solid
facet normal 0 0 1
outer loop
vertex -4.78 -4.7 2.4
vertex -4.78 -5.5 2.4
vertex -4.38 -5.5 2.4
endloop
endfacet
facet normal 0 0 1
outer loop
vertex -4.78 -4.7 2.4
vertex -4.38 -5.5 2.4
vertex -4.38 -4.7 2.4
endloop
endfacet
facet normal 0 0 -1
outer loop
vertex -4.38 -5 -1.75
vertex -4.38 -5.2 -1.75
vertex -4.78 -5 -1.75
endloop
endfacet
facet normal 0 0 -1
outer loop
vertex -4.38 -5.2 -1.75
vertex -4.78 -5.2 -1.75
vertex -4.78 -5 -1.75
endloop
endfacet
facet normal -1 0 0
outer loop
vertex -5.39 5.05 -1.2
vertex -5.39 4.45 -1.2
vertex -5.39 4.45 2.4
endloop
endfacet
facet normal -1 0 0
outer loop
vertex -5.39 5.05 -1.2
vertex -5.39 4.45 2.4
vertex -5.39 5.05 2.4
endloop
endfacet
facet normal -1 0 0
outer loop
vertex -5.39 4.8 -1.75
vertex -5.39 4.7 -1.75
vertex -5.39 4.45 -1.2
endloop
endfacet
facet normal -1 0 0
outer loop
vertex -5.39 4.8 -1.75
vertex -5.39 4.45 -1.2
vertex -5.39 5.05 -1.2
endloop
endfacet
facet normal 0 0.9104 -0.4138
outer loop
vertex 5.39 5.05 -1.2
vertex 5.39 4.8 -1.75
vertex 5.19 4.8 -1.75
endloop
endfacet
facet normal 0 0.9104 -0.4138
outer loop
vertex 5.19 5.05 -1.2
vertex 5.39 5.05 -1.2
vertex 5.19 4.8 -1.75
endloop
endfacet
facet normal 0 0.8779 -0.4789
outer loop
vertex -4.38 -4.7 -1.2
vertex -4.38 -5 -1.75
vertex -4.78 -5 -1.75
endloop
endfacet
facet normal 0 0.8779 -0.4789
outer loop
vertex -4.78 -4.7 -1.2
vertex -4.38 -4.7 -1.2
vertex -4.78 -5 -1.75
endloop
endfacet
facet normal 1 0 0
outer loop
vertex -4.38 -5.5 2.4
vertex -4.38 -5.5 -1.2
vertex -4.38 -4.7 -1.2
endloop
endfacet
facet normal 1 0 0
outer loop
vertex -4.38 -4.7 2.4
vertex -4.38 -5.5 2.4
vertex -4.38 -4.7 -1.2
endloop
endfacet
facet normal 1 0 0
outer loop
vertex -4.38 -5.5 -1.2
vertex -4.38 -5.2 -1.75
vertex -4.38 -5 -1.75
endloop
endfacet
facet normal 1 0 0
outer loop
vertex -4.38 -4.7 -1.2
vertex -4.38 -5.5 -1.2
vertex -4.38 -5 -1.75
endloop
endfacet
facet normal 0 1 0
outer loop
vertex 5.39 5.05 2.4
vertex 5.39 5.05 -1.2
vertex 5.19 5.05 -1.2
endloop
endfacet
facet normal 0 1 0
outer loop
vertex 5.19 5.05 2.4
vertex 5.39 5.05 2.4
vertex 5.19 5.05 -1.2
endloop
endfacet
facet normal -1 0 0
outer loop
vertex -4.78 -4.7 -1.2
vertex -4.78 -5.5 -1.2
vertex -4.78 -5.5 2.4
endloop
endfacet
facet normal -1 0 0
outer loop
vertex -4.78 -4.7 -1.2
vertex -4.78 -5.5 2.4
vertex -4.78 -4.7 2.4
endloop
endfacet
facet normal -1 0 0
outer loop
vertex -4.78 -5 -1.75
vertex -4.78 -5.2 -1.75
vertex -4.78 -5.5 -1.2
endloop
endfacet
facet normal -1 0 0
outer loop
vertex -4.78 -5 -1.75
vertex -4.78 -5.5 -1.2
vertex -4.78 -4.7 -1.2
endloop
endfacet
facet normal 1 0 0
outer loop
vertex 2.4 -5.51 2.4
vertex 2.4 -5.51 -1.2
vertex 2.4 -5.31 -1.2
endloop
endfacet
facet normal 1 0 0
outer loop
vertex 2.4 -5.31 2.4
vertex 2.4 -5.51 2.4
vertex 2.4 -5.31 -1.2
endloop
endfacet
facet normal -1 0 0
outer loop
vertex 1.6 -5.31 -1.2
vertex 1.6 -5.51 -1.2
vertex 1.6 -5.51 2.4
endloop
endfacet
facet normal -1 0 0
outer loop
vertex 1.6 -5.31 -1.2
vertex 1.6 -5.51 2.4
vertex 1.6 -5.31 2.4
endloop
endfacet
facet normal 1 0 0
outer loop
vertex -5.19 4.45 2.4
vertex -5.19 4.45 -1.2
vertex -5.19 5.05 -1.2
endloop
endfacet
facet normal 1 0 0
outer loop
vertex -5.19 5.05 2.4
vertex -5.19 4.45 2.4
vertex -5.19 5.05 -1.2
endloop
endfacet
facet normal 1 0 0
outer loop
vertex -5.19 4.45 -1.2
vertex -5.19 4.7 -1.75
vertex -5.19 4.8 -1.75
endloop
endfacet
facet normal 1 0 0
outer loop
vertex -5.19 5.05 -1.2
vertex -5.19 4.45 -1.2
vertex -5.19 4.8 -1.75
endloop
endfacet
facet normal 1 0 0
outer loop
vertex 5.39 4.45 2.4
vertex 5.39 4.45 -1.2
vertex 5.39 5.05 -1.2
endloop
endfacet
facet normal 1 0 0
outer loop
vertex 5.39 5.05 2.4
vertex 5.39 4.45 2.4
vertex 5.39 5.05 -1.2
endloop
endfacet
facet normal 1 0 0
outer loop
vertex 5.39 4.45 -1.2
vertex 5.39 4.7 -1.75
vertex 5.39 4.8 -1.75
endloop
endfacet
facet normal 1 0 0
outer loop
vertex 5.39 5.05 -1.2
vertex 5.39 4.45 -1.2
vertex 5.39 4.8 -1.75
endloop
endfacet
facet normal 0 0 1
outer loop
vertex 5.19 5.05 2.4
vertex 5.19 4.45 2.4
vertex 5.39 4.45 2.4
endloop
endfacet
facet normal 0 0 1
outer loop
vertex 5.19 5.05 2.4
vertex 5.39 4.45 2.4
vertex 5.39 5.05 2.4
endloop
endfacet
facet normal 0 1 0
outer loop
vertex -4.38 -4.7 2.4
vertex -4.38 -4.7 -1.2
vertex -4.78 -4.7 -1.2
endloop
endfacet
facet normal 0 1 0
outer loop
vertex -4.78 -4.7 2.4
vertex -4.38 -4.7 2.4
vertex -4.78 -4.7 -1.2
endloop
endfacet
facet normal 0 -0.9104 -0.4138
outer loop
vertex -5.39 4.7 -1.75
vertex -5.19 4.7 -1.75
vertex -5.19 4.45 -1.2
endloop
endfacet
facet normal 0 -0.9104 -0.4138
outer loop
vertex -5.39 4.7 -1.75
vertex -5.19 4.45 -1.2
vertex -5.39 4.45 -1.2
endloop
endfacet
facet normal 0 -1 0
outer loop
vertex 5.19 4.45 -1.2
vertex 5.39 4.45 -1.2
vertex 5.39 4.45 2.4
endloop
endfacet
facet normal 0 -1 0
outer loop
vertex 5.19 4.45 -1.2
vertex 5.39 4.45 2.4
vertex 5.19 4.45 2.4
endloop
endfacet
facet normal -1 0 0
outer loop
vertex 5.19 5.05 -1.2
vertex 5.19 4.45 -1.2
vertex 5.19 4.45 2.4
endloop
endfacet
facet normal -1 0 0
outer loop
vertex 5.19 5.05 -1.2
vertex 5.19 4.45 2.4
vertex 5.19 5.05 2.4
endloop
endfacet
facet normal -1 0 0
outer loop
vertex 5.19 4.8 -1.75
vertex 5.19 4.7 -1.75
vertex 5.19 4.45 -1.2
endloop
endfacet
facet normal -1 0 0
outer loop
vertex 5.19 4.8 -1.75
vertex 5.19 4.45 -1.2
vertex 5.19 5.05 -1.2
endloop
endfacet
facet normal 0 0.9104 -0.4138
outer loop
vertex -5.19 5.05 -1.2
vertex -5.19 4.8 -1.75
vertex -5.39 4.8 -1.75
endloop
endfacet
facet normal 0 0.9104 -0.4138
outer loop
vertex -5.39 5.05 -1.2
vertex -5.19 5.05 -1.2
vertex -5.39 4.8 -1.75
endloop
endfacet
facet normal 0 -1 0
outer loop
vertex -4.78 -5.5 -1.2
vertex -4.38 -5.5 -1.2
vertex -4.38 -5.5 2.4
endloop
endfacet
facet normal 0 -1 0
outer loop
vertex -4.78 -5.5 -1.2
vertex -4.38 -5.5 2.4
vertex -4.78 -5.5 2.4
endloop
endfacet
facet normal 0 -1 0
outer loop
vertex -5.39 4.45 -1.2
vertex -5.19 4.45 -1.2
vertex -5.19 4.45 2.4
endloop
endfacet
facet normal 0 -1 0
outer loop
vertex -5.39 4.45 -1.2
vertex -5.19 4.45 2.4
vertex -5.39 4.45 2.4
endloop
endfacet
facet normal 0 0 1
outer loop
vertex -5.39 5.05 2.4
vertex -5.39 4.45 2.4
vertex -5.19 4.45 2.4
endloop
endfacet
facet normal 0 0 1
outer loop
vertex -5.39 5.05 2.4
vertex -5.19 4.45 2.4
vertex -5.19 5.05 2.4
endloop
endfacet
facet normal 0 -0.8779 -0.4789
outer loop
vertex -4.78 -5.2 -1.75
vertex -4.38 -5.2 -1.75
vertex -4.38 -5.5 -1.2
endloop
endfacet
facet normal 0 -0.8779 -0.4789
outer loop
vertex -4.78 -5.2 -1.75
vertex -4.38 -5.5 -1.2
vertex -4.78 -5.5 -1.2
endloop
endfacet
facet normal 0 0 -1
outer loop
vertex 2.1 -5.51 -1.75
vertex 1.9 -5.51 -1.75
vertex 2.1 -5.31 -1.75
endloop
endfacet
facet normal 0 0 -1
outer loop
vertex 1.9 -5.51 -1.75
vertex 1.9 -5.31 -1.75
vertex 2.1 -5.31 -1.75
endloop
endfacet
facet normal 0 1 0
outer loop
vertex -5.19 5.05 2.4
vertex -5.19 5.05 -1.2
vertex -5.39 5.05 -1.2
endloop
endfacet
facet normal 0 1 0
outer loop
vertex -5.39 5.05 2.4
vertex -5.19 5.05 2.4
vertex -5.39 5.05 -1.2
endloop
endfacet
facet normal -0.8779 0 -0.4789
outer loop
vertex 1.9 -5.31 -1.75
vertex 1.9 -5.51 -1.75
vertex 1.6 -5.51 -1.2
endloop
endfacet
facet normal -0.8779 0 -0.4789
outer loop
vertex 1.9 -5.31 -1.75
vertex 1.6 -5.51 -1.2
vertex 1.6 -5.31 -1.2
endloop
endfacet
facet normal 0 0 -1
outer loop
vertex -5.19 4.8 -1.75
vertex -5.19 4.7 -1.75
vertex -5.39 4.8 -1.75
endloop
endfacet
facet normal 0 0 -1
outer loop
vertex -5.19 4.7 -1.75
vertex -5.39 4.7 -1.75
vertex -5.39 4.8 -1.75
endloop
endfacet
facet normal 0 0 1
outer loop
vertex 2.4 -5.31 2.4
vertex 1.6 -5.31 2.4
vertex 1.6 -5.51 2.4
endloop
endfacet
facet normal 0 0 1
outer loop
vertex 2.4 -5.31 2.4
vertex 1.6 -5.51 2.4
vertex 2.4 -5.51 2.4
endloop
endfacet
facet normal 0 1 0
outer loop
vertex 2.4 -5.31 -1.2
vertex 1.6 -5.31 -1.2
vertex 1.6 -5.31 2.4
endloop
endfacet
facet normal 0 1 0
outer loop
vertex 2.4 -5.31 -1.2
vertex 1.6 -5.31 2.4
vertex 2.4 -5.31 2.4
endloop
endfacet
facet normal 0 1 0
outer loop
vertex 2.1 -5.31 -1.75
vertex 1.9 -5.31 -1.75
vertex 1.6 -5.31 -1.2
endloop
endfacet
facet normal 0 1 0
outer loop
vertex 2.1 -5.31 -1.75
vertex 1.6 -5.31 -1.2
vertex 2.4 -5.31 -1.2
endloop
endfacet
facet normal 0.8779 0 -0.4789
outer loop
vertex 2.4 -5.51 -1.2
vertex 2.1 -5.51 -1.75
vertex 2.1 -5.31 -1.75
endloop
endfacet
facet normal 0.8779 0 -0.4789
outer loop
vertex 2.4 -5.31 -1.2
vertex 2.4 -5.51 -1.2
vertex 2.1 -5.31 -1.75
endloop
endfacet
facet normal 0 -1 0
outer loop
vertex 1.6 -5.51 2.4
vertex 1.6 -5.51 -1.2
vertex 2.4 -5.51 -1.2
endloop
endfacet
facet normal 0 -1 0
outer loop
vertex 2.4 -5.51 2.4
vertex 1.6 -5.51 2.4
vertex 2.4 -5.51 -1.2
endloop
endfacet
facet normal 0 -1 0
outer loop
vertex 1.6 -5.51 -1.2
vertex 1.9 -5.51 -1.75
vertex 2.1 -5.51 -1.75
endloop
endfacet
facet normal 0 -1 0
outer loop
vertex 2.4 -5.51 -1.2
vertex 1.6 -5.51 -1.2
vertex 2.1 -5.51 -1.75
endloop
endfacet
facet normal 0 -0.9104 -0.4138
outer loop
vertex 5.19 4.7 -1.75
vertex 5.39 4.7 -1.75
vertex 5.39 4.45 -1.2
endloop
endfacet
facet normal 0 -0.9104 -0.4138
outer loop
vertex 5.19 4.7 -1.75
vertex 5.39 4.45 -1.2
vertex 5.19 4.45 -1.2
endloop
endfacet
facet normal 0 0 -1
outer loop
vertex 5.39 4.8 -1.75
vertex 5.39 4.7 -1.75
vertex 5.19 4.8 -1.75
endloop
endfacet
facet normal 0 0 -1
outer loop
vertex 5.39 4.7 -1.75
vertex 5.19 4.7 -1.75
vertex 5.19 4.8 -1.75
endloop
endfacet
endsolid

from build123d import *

# Parameters (mm, degrees)
BOX035_W           = 0.6
BOX035_H           = 0.2
BOX035_DEPTH       = 4.15
CHAMFER023_1_SIZE2 = 0.25
CHAMFER023_1_SIZE  = 0.55
CHAMFER023_2_SIZE2 = 0.25
CHAMFER023_2_SIZE  = 0.55
BOX034_W           = 0.8
BOX034_H           = 0.4
BOX034_DEPTH       = 4.15
CHAMFER022_1_SIZE2 = 0.3
CHAMFER022_1_SIZE  = 0.55
CHAMFER022_2_SIZE2 = 0.3
CHAMFER022_2_SIZE  = 0.55
BOX033_W           = 0.8
BOX033_H           = 0.2
BOX033_DEPTH       = 4.15
CHAMFER021_1_SIZE2 = 0.3
CHAMFER021_1_SIZE  = 0.55
CHAMFER021_2_SIZE2 = 0.3
CHAMFER021_2_SIZE  = 0.55
BOX036_W           = 0.6
BOX036_H           = 0.2
BOX036_DEPTH       = 4.15
CHAMFER024_1_SIZE2 = 0.25
CHAMFER024_1_SIZE  = 0.55
CHAMFER024_2_SIZE2 = 0.25
CHAMFER024_2_SIZE  = 0.55


with BuildPart() as pg1232_pin3:
    # Box035 → Box035 (new body)
    with BuildSketch(Plane(origin=(5.39, 4.45, -1.75), x_dir=(0, 1, 0), z_dir=(0, 0, 1))):
        with Locations((0.3, 0.1)):
            Rectangle(BOX035_W, BOX035_H)
    extrude(amount=BOX035_DEPTH)

    # Chamfer023 1
    chamfer023_1_edges = [pg1232_pin3.edges().sort_by_distance(p)[0] for p in [
        (5.29, 5.05, -1.75),
    ]]
    chamfer023_1_side = pg1232_pin3.faces().sort_by_distance((5.29, 5.05, 0.325))[0]
    chamfer(chamfer023_1_edges, length=CHAMFER023_1_SIZE, length2=CHAMFER023_1_SIZE2, reference=chamfer023_1_side)

    # Chamfer023 2
    chamfer023_2_edges = [pg1232_pin3.edges().sort_by_distance(p)[0] for p in [
        (5.29, 4.45, -1.75),
    ]]
    chamfer023_2_side = pg1232_pin3.faces().sort_by_distance((5.29, 4.45, 0.325))[0]
    chamfer(chamfer023_2_edges, length=CHAMFER023_2_SIZE, length2=CHAMFER023_2_SIZE2, reference=chamfer023_2_side)


with BuildPart() as pg1232_pin2:
    # Box034 → Box034 (new body)
    with BuildSketch(Plane(origin=(-4.38, -5.5, -1.75), x_dir=(0, 1, 0), z_dir=(0, 0, 1))):
        with Locations((0.4, 0.2)):
            Rectangle(BOX034_W, BOX034_H)
    extrude(amount=BOX034_DEPTH)

    # Chamfer022 1
    chamfer022_1_edges = [pg1232_pin2.edges().sort_by_distance(p)[0] for p in [
        (-4.58, -4.7, -1.75),
    ]]
    chamfer022_1_side = pg1232_pin2.faces().sort_by_distance((-4.58, -4.7, 0.325))[0]
    chamfer(chamfer022_1_edges, length=CHAMFER022_1_SIZE, length2=CHAMFER022_1_SIZE2, reference=chamfer022_1_side)

    # Chamfer022 2
    chamfer022_2_edges = [pg1232_pin2.edges().sort_by_distance(p)[0] for p in [
        (-4.58, -5.5, -1.75),
    ]]
    chamfer022_2_side = pg1232_pin2.faces().sort_by_distance((-4.58, -5.5, 0.325))[0]
    chamfer(chamfer022_2_edges, length=CHAMFER022_2_SIZE, length2=CHAMFER022_2_SIZE2, reference=chamfer022_2_side)


with BuildPart() as pg1232_pin1:
    # Box033 → Box033 (new body)
    with BuildSketch(Plane(origin=(1.6, -5.51, -1.75), x_dir=(1, 0, 0), z_dir=(0, 0, 1))):
        with Locations((0.4, 0.1)):
            Rectangle(BOX033_W, BOX033_H)
    extrude(amount=BOX033_DEPTH)

    # Chamfer021 1
    chamfer021_1_edges = [pg1232_pin1.edges().sort_by_distance(p)[0] for p in [
        (2.4, -5.41, -1.75),
    ]]
    chamfer021_1_side = pg1232_pin1.faces().sort_by_distance((2.4, -5.41, 0.325))[0]
    chamfer(chamfer021_1_edges, length=CHAMFER021_1_SIZE, length2=CHAMFER021_1_SIZE2, reference=chamfer021_1_side)

    # Chamfer021 2
    chamfer021_2_edges = [pg1232_pin1.edges().sort_by_distance(p)[0] for p in [
        (1.6, -5.41, -1.75),
    ]]
    chamfer021_2_side = pg1232_pin1.faces().sort_by_distance((1.6, -5.41, 0.325))[0]
    chamfer(chamfer021_2_edges, length=CHAMFER021_2_SIZE, length2=CHAMFER021_2_SIZE2, reference=chamfer021_2_side)


with BuildPart() as pg1232_pins:
    # Box036 → Box036 (new body)
    with BuildSketch(Plane(origin=(-5.19, 4.45, -1.75), x_dir=(0, 1, 0), z_dir=(0, 0, 1))):
        with Locations((0.3, 0.1)):
            Rectangle(BOX036_W, BOX036_H)
    extrude(amount=BOX036_DEPTH)

    # Chamfer024 1
    chamfer024_1_edges = [pg1232_pins.edges().sort_by_distance(p)[0] for p in [
        (-5.29, 5.05, -1.75),
    ]]
    chamfer024_1_side = pg1232_pins.faces().sort_by_distance((-5.29, 5.05, 0.325))[0]
    chamfer(chamfer024_1_edges, length=CHAMFER024_1_SIZE, length2=CHAMFER024_1_SIZE2, reference=chamfer024_1_side)

    # Chamfer024 2
    chamfer024_2_edges = [pg1232_pins.edges().sort_by_distance(p)[0] for p in [
        (-5.29, 4.45, -1.75),
    ]]
    chamfer024_2_side = pg1232_pins.faces().sort_by_distance((-5.29, 4.45, 0.325))[0]
    chamfer(chamfer024_2_edges, length=CHAMFER024_2_SIZE, length2=CHAMFER024_2_SIZE2, reference=chamfer024_2_side)

    # Fusion009: union PG1232_Pin3, PG1232_Pin2, PG1232_Pin1
    add(pg1232_pin3.part)
    add(pg1232_pin2.part)
    add(pg1232_pin1.part)


solid = pg1232_pins.part
